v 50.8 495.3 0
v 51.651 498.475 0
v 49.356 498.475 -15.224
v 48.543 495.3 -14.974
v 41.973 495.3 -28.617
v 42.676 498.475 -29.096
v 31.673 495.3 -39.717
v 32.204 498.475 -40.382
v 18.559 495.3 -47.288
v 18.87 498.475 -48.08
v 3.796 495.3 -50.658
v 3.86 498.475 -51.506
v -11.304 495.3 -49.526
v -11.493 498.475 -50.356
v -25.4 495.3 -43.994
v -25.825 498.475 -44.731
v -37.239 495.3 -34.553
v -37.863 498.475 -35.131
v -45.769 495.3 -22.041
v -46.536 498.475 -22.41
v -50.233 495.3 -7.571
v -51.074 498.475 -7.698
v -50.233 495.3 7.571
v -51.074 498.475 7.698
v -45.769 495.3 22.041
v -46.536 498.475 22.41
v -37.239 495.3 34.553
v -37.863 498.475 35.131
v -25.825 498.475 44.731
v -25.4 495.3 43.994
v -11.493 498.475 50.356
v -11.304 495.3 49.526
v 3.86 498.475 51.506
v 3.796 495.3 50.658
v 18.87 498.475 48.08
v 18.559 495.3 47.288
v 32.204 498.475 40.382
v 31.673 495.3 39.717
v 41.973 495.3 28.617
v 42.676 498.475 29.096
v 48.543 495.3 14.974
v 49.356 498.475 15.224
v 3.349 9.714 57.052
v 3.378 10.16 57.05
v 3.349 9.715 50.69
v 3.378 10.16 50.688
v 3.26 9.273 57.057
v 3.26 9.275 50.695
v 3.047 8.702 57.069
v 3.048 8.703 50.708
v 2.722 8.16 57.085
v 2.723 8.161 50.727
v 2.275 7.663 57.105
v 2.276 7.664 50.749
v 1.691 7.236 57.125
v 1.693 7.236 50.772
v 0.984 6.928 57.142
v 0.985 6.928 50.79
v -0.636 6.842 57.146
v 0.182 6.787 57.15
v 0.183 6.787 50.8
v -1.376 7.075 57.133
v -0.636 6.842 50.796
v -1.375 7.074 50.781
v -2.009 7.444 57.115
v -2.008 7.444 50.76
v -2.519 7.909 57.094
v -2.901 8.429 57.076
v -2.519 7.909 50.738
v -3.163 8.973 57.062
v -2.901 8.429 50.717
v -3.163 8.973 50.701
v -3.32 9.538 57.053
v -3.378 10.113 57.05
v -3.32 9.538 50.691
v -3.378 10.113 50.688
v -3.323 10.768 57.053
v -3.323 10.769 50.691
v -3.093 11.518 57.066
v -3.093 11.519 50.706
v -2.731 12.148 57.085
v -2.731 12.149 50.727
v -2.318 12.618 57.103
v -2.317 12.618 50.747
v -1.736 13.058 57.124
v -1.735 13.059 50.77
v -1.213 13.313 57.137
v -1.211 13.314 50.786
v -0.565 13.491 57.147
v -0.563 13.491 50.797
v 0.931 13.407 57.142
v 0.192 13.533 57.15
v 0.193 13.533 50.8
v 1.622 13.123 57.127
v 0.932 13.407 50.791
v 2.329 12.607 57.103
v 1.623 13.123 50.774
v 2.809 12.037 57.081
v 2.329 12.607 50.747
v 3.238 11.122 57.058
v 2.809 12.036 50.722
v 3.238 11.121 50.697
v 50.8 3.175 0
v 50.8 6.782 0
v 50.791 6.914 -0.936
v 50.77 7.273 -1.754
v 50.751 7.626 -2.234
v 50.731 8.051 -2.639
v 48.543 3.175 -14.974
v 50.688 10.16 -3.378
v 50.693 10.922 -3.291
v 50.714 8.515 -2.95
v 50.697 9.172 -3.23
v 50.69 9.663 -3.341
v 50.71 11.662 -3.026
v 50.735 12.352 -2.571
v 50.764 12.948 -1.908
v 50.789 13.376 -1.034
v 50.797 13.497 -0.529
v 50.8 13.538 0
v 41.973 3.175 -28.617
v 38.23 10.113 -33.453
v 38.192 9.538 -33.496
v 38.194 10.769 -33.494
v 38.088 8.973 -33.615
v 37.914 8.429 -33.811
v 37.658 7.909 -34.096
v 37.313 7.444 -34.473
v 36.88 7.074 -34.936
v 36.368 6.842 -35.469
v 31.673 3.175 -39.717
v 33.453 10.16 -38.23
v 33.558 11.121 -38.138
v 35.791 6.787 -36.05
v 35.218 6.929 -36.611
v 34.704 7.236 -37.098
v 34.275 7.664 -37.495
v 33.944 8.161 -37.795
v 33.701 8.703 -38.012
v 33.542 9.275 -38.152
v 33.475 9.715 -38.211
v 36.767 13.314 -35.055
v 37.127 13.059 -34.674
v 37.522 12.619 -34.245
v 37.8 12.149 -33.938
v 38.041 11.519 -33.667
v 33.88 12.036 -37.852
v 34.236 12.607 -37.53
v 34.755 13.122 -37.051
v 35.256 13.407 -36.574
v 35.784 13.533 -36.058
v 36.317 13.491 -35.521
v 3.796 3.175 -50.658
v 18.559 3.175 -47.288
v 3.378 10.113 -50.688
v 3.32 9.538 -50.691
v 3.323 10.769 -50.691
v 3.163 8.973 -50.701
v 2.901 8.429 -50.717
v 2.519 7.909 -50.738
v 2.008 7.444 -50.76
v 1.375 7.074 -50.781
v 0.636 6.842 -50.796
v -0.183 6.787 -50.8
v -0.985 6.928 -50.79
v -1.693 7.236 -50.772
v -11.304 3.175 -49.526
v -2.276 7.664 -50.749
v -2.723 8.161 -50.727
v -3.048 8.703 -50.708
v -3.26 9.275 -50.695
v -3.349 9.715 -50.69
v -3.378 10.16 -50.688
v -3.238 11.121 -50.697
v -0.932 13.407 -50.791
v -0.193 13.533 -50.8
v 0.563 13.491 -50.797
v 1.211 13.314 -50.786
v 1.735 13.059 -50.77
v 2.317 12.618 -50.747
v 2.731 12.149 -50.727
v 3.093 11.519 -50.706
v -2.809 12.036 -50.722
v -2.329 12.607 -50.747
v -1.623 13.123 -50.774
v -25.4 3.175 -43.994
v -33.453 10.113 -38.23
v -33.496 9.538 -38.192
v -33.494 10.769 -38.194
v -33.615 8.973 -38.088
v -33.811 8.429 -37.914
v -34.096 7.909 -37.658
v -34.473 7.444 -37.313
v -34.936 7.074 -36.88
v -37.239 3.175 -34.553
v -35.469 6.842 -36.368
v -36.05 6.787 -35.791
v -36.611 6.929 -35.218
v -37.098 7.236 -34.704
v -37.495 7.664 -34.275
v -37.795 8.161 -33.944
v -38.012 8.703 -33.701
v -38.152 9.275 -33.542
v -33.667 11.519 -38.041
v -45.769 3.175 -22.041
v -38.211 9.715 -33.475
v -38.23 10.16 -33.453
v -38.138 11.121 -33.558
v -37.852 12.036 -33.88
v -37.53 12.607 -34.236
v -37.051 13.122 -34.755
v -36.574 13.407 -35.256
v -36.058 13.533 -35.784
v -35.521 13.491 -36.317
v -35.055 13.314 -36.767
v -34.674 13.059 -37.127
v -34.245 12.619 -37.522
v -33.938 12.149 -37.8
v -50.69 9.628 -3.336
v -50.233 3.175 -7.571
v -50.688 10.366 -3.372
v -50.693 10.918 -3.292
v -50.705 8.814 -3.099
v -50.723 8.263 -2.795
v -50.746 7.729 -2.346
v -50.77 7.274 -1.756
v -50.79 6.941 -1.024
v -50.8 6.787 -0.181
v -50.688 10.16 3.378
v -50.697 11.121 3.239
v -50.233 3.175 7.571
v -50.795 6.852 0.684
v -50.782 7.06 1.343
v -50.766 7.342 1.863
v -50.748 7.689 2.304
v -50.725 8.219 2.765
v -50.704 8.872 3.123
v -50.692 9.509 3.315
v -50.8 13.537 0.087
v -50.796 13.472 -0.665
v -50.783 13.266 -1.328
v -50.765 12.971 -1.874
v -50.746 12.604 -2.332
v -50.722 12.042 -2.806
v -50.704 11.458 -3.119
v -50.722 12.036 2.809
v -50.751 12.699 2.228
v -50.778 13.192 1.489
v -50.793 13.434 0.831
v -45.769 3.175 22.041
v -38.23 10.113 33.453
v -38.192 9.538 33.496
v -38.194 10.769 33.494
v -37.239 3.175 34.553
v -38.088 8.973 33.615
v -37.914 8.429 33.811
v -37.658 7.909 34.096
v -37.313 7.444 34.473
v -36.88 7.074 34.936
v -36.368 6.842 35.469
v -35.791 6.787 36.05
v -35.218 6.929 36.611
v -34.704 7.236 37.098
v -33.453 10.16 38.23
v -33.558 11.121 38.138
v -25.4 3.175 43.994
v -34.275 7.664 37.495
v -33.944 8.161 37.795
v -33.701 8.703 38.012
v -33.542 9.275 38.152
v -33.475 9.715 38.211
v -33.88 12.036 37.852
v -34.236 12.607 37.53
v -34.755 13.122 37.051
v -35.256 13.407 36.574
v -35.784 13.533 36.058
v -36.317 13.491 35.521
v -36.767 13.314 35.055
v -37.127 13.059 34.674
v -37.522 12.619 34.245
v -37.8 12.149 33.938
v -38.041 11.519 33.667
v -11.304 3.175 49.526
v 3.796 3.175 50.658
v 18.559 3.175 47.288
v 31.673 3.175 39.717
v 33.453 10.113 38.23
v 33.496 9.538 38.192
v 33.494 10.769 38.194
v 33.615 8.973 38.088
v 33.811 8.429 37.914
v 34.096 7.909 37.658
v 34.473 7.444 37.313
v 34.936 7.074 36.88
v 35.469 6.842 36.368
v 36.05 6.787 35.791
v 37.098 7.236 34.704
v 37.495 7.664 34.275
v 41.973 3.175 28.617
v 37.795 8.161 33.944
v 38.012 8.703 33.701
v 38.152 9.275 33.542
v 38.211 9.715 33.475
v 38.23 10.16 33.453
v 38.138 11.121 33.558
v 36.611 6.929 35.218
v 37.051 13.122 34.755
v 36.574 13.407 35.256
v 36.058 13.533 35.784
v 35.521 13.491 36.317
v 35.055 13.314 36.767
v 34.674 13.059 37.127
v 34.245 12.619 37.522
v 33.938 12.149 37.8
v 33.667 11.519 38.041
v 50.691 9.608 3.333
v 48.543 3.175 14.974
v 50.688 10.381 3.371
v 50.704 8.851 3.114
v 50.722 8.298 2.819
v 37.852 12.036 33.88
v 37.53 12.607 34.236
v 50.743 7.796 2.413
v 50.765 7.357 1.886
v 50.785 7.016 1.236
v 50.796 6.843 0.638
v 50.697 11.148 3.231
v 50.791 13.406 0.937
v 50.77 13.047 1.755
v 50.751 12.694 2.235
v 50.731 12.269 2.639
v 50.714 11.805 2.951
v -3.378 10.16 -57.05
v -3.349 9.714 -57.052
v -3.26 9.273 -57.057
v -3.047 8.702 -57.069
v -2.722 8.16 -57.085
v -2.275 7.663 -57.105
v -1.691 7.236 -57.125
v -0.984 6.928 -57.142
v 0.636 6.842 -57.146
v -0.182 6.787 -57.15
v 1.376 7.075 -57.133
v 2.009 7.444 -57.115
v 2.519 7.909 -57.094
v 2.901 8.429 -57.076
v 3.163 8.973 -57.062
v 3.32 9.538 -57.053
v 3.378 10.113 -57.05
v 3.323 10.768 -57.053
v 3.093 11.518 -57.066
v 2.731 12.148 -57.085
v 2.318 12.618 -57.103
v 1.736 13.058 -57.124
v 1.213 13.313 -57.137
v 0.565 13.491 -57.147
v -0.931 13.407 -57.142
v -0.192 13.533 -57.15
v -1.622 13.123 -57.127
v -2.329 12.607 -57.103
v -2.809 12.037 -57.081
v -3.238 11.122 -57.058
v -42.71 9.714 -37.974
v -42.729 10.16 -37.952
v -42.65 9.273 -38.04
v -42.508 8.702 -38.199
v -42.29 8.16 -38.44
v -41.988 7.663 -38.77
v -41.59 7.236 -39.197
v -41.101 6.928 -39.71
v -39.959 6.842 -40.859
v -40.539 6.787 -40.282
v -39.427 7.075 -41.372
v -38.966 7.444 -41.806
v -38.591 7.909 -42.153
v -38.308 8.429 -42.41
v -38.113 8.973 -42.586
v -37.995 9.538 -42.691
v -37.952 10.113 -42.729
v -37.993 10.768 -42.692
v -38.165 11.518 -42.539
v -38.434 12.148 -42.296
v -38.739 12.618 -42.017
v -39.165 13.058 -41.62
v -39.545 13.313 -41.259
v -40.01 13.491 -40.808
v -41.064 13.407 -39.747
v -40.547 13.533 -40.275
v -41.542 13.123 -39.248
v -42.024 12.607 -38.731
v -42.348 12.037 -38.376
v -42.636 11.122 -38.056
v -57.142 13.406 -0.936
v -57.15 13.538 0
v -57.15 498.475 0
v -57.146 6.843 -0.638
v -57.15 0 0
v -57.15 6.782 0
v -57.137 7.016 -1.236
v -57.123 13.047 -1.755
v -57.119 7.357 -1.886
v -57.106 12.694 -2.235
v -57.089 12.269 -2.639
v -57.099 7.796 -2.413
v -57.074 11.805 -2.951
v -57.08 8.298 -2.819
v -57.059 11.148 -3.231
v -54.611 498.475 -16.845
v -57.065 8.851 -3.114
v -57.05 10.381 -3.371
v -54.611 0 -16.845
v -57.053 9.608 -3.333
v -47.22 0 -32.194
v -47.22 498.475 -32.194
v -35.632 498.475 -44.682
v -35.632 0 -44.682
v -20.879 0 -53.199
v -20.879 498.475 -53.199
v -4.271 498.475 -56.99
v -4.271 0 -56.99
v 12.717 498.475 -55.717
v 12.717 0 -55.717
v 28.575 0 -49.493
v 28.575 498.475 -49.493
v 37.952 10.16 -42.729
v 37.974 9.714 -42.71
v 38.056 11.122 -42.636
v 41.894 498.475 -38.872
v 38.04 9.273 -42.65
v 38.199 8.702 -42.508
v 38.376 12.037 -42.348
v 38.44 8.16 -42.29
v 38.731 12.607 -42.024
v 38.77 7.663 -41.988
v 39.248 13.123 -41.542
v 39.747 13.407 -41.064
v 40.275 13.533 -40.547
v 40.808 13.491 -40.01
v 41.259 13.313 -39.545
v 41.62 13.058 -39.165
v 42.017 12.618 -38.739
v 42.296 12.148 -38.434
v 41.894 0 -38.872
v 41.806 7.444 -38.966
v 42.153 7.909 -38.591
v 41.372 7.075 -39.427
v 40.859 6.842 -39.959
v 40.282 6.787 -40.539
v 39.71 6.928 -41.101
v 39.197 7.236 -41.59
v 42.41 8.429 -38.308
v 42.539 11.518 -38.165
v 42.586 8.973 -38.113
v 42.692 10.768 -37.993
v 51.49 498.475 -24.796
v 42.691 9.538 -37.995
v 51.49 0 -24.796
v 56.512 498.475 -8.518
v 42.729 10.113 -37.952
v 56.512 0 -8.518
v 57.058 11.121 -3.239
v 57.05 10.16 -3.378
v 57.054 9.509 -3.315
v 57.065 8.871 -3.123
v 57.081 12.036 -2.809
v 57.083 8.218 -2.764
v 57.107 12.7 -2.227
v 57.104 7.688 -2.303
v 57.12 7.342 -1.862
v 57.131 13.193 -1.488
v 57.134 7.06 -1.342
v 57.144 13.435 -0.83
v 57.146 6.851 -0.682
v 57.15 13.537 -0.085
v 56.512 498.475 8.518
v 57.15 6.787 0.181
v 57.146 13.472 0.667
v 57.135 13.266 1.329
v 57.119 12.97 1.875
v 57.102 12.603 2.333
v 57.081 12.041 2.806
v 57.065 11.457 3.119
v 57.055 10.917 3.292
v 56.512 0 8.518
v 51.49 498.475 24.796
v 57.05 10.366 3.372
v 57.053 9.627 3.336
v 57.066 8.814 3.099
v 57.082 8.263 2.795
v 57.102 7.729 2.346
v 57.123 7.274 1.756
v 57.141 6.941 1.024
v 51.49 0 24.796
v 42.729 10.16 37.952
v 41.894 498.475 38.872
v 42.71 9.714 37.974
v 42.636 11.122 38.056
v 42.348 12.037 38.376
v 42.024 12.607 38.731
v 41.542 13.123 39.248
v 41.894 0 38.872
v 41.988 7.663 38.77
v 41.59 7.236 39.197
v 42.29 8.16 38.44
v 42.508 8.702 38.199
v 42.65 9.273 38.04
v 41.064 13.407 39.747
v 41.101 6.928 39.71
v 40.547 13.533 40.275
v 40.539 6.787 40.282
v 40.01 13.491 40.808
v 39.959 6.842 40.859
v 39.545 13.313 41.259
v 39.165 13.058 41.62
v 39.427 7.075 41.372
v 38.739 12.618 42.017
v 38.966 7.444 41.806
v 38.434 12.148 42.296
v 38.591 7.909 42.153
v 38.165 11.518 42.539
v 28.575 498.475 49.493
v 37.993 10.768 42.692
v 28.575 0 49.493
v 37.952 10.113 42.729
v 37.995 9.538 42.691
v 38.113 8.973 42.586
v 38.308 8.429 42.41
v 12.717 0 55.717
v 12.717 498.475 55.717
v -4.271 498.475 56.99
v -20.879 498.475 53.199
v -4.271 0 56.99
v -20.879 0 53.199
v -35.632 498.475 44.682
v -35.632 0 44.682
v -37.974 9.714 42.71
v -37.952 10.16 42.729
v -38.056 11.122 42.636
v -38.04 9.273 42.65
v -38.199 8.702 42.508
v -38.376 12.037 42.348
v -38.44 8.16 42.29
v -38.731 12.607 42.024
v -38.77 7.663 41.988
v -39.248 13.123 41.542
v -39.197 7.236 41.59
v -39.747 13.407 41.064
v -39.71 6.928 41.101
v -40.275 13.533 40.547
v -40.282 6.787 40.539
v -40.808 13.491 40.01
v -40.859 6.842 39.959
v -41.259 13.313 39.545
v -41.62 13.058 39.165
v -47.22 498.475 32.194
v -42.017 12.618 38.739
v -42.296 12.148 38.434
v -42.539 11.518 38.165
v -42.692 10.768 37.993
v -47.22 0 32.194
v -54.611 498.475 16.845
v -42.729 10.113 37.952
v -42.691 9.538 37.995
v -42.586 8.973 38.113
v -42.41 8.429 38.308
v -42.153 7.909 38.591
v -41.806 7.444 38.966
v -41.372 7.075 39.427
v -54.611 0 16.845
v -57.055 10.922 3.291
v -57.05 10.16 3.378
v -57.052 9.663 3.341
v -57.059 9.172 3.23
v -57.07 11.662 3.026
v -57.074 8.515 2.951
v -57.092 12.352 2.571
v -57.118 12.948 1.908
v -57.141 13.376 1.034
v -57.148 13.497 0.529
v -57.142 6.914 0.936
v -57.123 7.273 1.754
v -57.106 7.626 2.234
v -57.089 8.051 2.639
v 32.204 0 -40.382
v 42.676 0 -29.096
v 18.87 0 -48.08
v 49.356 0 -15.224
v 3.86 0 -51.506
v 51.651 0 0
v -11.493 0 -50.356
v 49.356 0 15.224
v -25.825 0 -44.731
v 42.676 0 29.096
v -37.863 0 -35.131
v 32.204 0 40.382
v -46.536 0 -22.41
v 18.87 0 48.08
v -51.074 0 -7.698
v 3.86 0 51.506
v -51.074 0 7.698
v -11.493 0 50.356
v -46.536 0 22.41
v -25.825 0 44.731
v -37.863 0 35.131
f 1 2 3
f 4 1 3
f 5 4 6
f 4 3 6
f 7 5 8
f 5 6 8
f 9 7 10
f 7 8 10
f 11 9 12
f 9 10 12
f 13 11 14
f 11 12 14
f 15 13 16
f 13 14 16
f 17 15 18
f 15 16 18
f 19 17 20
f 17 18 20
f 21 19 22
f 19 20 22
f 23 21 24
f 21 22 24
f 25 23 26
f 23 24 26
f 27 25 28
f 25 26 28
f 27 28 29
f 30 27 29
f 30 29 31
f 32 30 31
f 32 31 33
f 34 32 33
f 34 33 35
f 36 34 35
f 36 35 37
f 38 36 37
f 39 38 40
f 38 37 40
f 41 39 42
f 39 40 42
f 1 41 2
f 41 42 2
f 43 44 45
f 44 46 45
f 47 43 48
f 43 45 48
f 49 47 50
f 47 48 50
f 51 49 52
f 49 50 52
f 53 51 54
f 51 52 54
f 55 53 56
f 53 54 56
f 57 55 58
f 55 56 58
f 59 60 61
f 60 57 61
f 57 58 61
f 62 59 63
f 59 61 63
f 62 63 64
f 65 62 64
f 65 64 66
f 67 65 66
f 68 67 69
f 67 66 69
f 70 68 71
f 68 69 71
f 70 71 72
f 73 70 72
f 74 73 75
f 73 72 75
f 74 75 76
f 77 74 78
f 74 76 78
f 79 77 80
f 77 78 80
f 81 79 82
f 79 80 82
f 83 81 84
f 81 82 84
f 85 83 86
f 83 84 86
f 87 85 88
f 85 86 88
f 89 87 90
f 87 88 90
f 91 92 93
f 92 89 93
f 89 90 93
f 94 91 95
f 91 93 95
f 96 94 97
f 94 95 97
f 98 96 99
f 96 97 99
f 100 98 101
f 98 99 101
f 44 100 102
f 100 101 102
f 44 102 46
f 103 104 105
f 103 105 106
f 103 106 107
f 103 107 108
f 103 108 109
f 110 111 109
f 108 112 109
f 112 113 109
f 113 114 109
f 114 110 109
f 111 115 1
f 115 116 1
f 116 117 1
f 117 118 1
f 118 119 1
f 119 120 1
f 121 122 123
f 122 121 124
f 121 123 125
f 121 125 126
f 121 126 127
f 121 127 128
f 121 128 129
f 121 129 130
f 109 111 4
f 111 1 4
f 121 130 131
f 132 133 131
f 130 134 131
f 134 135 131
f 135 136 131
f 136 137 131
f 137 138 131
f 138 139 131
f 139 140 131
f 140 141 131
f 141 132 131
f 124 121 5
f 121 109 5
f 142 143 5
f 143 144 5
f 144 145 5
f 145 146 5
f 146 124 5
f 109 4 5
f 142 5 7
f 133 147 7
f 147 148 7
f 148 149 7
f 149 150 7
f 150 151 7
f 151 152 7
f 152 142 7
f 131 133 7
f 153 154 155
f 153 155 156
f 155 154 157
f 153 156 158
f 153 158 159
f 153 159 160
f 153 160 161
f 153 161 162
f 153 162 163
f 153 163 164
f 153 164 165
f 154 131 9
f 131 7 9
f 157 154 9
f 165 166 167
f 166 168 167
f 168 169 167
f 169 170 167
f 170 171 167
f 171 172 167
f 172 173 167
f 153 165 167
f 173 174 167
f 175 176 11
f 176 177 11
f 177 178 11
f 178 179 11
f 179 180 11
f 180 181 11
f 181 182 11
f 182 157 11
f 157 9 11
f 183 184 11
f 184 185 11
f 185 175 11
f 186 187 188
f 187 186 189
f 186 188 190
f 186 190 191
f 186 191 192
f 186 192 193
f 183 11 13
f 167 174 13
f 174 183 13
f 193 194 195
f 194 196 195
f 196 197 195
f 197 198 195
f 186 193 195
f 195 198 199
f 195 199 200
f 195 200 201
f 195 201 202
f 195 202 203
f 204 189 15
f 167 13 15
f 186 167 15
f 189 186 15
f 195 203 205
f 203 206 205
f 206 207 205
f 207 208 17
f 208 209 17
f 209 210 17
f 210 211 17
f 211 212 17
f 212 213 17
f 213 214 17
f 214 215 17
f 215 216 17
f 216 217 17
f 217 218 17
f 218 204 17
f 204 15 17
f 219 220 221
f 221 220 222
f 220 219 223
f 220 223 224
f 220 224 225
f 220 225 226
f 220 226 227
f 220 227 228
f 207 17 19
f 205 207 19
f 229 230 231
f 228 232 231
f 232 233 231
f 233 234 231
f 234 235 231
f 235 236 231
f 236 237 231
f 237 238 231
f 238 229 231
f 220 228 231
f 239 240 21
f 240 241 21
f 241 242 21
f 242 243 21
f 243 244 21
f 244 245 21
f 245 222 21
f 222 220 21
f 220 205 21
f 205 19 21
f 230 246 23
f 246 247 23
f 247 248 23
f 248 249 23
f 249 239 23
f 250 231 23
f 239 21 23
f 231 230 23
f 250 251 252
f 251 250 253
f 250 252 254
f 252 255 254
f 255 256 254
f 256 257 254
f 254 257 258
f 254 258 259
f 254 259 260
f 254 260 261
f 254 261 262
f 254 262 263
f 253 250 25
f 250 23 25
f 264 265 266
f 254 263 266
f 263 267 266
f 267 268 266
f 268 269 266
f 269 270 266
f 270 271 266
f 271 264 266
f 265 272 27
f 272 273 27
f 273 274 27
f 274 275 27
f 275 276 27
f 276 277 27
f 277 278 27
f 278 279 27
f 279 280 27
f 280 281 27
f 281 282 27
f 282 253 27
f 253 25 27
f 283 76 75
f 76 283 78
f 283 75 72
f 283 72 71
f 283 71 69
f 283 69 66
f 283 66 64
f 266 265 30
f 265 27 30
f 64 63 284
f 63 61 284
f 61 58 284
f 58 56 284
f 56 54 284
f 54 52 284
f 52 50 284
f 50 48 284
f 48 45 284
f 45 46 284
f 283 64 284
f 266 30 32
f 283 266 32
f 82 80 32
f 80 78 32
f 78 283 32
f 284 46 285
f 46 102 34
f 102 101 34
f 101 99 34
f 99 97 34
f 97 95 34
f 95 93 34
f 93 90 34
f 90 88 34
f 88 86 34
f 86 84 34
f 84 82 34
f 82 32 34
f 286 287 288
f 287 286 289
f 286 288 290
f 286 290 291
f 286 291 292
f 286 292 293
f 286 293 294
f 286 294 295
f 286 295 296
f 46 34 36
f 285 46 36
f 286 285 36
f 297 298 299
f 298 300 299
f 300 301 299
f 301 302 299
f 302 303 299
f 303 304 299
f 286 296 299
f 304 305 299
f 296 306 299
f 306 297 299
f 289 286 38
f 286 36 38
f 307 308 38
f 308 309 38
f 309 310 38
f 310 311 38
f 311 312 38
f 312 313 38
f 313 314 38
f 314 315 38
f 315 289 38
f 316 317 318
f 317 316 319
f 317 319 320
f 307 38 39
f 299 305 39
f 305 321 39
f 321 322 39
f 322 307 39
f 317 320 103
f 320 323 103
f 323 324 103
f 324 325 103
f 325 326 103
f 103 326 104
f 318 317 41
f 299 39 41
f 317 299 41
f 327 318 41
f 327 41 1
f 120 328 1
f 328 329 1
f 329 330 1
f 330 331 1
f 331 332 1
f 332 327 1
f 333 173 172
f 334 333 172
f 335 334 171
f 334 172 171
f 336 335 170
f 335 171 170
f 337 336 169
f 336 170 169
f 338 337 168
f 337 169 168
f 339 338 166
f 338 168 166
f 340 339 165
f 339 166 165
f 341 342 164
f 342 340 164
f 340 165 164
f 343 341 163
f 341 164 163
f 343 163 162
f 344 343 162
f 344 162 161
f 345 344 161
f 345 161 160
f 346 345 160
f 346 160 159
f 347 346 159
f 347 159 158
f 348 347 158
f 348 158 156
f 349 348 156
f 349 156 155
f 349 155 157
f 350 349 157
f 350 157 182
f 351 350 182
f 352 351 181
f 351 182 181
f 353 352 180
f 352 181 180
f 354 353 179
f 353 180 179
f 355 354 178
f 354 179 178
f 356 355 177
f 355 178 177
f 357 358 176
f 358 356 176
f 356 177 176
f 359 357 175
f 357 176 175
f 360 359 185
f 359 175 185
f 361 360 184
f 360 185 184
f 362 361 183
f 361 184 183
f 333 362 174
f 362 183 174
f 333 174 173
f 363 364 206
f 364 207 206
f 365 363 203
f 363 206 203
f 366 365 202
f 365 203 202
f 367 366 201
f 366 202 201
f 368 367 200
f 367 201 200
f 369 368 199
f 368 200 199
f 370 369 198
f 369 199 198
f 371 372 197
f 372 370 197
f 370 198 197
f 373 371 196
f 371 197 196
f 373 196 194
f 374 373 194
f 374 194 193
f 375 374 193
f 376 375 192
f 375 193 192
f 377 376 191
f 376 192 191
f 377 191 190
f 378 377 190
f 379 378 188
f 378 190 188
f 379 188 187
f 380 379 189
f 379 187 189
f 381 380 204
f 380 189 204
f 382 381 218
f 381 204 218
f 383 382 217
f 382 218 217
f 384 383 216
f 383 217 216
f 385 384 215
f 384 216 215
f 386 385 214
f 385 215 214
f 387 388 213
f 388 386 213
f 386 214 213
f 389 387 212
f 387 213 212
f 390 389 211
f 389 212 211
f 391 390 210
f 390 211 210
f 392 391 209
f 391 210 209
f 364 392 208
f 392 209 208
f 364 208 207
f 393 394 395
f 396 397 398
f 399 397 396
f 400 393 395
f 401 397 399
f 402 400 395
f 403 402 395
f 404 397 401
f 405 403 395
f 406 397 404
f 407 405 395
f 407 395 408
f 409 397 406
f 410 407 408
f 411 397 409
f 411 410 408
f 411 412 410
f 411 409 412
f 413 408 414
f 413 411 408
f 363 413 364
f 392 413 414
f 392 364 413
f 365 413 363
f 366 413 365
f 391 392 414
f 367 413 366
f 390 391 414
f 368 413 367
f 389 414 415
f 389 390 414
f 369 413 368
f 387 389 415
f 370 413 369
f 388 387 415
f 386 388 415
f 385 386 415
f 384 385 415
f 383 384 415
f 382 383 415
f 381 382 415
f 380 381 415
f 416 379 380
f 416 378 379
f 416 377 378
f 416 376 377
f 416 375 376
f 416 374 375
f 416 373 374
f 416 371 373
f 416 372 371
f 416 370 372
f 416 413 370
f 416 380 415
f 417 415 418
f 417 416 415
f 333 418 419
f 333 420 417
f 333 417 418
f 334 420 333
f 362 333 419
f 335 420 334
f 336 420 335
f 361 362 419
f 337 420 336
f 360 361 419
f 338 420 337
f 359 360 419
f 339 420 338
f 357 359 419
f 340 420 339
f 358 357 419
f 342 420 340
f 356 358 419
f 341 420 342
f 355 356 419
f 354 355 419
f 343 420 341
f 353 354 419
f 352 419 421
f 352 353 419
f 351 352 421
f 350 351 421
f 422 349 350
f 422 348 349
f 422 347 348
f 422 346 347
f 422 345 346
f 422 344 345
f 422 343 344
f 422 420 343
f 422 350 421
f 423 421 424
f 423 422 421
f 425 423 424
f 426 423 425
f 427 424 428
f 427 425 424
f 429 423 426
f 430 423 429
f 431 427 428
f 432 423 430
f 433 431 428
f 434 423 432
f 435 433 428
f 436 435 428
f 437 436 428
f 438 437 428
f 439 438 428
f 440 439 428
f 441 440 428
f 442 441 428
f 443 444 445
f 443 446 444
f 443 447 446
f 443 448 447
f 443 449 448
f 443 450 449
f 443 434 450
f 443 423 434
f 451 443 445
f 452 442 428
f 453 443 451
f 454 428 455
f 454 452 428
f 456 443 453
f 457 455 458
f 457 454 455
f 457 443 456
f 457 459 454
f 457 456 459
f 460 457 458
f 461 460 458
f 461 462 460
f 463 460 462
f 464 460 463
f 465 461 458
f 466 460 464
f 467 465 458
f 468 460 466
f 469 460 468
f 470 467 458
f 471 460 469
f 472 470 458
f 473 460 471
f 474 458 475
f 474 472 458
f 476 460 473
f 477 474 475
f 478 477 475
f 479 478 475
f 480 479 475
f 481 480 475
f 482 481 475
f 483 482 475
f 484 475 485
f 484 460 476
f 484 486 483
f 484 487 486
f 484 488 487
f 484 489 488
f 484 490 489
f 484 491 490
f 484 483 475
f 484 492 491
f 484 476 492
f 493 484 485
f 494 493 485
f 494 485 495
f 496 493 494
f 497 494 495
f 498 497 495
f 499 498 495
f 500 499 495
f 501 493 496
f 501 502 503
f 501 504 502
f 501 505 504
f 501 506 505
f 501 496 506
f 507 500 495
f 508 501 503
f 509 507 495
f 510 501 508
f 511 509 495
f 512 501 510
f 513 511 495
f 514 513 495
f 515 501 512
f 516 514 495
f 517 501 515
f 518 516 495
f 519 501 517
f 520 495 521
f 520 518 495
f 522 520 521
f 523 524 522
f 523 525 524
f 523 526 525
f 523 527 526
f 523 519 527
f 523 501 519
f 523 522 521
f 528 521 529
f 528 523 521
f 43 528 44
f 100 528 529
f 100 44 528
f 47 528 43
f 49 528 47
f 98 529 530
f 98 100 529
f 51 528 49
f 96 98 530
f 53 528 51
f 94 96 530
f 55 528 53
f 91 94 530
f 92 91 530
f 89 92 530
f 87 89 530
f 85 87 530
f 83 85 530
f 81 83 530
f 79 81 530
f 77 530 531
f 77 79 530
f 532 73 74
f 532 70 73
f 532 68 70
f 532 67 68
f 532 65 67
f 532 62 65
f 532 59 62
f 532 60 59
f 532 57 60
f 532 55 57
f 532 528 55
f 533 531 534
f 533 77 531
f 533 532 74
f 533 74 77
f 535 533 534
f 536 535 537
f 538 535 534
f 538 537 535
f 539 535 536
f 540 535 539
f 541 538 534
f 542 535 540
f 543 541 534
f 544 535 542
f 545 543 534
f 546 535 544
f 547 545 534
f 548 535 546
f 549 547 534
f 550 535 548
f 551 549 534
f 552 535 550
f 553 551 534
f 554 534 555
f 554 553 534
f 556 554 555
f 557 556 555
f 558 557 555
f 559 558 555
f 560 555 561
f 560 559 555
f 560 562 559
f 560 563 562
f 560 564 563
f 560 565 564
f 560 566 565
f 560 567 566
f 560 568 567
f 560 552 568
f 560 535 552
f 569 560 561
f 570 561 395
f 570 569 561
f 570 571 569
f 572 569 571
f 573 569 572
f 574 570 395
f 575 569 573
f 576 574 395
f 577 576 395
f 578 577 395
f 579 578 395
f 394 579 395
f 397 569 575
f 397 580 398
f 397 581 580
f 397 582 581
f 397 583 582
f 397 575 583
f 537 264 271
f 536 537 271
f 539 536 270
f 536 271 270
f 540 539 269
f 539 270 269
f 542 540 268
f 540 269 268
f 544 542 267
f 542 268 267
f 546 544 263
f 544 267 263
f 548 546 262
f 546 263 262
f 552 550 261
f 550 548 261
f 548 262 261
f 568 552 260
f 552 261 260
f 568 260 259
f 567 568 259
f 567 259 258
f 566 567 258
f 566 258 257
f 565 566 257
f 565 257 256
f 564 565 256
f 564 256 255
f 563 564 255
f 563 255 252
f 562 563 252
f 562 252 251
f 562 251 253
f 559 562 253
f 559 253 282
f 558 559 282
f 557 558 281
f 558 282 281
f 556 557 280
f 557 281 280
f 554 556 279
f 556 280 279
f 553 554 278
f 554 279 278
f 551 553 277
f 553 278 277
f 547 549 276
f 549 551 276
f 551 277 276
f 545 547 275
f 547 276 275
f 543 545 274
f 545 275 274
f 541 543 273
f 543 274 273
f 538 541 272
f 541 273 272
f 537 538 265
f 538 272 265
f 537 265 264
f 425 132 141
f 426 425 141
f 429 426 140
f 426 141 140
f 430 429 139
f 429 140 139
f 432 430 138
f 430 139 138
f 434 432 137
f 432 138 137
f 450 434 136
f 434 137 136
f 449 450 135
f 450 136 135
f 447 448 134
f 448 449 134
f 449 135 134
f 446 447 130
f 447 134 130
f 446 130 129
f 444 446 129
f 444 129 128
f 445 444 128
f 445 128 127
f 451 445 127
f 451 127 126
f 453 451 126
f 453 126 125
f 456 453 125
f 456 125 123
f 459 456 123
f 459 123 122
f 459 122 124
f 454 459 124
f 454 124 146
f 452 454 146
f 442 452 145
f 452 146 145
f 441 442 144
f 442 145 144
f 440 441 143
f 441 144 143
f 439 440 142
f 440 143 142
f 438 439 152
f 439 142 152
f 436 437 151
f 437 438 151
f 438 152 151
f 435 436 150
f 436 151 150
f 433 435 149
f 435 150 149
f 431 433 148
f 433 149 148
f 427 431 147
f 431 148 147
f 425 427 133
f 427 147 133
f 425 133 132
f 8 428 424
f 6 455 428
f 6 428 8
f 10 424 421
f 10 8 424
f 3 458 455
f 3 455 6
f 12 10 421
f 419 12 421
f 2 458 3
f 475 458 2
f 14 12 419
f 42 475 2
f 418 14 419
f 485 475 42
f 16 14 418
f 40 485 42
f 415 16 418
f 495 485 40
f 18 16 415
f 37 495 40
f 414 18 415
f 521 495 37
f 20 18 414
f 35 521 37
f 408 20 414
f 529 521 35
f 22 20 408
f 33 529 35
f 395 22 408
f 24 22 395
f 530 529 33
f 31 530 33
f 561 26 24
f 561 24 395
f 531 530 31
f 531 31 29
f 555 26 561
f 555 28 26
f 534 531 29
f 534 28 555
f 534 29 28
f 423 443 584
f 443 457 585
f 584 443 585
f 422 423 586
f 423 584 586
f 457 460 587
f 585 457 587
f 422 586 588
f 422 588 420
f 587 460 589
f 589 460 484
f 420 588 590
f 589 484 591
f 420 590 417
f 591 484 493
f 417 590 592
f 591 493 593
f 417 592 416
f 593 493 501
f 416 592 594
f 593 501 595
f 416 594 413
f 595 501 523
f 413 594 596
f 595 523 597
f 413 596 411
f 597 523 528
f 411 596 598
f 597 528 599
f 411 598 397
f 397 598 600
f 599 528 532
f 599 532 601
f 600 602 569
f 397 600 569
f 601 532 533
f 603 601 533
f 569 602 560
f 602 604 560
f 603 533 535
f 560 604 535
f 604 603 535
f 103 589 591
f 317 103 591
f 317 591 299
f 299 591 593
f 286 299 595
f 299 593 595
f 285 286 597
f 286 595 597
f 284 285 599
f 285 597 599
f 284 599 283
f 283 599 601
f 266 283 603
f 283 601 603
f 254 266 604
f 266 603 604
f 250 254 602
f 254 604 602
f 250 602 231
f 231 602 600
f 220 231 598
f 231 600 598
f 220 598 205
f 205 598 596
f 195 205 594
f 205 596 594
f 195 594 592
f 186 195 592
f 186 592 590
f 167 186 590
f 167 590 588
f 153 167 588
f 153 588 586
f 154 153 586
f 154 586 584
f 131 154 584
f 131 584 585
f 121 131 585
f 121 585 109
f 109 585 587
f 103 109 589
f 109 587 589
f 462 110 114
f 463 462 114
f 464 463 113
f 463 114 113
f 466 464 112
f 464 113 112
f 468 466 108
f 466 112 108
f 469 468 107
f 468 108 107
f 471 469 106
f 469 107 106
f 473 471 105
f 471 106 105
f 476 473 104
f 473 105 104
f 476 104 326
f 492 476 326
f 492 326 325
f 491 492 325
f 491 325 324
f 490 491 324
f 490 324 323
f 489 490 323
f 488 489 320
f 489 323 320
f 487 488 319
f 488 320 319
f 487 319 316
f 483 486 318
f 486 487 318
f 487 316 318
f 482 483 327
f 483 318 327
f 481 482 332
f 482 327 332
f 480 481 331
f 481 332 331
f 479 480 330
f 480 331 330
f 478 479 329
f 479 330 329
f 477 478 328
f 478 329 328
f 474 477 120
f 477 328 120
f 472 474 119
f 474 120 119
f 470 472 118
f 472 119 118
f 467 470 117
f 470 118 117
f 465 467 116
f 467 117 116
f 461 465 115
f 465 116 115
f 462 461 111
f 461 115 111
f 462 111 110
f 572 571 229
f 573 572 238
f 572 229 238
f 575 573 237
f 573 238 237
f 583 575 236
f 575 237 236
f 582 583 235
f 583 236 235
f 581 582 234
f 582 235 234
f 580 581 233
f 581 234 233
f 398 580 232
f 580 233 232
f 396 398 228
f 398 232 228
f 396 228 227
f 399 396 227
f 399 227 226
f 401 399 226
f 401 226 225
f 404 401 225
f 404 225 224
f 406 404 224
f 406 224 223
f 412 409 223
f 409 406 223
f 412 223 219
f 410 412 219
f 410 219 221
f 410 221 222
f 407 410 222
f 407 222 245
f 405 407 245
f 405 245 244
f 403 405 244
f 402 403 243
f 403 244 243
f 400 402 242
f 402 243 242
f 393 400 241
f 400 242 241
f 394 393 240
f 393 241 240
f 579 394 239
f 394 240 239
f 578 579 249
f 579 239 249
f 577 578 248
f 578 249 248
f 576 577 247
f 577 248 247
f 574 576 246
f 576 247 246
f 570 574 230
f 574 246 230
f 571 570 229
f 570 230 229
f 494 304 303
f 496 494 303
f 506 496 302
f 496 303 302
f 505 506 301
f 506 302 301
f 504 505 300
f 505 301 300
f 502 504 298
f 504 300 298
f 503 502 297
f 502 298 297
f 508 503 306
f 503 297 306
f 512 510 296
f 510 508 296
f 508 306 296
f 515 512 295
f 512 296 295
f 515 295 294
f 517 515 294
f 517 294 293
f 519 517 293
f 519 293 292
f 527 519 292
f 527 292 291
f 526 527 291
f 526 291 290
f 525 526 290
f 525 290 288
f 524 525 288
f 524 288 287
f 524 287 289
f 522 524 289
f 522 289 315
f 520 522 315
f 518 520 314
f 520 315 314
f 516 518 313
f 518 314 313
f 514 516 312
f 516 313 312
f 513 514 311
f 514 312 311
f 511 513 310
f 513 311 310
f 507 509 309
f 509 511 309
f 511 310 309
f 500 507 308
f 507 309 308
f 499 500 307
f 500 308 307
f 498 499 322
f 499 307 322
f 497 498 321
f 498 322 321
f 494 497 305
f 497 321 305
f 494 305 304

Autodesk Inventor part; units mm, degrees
ref_plane "XZ Plane" through (0, 0, 0) normal (0, 1, 0) x (-1, 0, 0)
ref_plane "XY Plane" through (0, 0, 0) normal (0, 0, 1) x (1, 0, 0)
sketch "Sketch1" plane through (0, 0, 0) normal (0, 1, 0) x (-1, 0, 0)
  circle A0 centre (0, 0) radius 57.15
  dimension "d0" = 114.3
extrude "Extrusion1" add sketch "Sketch1" along normal blind 498.475
sketch "Sketch2" plane through (0, 498.475, 0) normal (0, 1, 0) x (1, 0, 0)
  circle A0 centre (0, 0) radius 50.8
  dimension "d3" = 101.6
extrude "Extrusion2" cut sketch "Sketch2" against normal blind 609.6
ref_plane "Work Plane1" through (57.15, 0, 0) normal (1, 0, 0) x (0, 1, 0)
chamfer "Chamfer1" distance 3.175 angle 15 1 edges at (-50.8, 498.475, 0) measured on face at (-13.148, 166.1583, 49.069)
sketch "Sketch4" plane through (0, 0, 0) normal (0, 0, 1) x (1, 0, 0)
  circle A0 centre (0, 10.16) radius 3.3782
  point P0 (0, 0)
  dimension "d21" = 10.16
  dimension "d22" = 6.7564
extrude "Extrusion3" cut sketch "Sketch4" along normal through all
pattern_circular "Circular Pattern2" count 8 over 360 about axis through (0, -10, 0) along (0, 1, 0) of "Extrusion3"
chamfer "Chamfer2" distance 3.175 angle 15 1 edges at (-50.8, 0, 0) measured on face at (25.4, 165.1, 43.9941)
properties part number "Combustion Chamber" material "Aluminum 6061"
